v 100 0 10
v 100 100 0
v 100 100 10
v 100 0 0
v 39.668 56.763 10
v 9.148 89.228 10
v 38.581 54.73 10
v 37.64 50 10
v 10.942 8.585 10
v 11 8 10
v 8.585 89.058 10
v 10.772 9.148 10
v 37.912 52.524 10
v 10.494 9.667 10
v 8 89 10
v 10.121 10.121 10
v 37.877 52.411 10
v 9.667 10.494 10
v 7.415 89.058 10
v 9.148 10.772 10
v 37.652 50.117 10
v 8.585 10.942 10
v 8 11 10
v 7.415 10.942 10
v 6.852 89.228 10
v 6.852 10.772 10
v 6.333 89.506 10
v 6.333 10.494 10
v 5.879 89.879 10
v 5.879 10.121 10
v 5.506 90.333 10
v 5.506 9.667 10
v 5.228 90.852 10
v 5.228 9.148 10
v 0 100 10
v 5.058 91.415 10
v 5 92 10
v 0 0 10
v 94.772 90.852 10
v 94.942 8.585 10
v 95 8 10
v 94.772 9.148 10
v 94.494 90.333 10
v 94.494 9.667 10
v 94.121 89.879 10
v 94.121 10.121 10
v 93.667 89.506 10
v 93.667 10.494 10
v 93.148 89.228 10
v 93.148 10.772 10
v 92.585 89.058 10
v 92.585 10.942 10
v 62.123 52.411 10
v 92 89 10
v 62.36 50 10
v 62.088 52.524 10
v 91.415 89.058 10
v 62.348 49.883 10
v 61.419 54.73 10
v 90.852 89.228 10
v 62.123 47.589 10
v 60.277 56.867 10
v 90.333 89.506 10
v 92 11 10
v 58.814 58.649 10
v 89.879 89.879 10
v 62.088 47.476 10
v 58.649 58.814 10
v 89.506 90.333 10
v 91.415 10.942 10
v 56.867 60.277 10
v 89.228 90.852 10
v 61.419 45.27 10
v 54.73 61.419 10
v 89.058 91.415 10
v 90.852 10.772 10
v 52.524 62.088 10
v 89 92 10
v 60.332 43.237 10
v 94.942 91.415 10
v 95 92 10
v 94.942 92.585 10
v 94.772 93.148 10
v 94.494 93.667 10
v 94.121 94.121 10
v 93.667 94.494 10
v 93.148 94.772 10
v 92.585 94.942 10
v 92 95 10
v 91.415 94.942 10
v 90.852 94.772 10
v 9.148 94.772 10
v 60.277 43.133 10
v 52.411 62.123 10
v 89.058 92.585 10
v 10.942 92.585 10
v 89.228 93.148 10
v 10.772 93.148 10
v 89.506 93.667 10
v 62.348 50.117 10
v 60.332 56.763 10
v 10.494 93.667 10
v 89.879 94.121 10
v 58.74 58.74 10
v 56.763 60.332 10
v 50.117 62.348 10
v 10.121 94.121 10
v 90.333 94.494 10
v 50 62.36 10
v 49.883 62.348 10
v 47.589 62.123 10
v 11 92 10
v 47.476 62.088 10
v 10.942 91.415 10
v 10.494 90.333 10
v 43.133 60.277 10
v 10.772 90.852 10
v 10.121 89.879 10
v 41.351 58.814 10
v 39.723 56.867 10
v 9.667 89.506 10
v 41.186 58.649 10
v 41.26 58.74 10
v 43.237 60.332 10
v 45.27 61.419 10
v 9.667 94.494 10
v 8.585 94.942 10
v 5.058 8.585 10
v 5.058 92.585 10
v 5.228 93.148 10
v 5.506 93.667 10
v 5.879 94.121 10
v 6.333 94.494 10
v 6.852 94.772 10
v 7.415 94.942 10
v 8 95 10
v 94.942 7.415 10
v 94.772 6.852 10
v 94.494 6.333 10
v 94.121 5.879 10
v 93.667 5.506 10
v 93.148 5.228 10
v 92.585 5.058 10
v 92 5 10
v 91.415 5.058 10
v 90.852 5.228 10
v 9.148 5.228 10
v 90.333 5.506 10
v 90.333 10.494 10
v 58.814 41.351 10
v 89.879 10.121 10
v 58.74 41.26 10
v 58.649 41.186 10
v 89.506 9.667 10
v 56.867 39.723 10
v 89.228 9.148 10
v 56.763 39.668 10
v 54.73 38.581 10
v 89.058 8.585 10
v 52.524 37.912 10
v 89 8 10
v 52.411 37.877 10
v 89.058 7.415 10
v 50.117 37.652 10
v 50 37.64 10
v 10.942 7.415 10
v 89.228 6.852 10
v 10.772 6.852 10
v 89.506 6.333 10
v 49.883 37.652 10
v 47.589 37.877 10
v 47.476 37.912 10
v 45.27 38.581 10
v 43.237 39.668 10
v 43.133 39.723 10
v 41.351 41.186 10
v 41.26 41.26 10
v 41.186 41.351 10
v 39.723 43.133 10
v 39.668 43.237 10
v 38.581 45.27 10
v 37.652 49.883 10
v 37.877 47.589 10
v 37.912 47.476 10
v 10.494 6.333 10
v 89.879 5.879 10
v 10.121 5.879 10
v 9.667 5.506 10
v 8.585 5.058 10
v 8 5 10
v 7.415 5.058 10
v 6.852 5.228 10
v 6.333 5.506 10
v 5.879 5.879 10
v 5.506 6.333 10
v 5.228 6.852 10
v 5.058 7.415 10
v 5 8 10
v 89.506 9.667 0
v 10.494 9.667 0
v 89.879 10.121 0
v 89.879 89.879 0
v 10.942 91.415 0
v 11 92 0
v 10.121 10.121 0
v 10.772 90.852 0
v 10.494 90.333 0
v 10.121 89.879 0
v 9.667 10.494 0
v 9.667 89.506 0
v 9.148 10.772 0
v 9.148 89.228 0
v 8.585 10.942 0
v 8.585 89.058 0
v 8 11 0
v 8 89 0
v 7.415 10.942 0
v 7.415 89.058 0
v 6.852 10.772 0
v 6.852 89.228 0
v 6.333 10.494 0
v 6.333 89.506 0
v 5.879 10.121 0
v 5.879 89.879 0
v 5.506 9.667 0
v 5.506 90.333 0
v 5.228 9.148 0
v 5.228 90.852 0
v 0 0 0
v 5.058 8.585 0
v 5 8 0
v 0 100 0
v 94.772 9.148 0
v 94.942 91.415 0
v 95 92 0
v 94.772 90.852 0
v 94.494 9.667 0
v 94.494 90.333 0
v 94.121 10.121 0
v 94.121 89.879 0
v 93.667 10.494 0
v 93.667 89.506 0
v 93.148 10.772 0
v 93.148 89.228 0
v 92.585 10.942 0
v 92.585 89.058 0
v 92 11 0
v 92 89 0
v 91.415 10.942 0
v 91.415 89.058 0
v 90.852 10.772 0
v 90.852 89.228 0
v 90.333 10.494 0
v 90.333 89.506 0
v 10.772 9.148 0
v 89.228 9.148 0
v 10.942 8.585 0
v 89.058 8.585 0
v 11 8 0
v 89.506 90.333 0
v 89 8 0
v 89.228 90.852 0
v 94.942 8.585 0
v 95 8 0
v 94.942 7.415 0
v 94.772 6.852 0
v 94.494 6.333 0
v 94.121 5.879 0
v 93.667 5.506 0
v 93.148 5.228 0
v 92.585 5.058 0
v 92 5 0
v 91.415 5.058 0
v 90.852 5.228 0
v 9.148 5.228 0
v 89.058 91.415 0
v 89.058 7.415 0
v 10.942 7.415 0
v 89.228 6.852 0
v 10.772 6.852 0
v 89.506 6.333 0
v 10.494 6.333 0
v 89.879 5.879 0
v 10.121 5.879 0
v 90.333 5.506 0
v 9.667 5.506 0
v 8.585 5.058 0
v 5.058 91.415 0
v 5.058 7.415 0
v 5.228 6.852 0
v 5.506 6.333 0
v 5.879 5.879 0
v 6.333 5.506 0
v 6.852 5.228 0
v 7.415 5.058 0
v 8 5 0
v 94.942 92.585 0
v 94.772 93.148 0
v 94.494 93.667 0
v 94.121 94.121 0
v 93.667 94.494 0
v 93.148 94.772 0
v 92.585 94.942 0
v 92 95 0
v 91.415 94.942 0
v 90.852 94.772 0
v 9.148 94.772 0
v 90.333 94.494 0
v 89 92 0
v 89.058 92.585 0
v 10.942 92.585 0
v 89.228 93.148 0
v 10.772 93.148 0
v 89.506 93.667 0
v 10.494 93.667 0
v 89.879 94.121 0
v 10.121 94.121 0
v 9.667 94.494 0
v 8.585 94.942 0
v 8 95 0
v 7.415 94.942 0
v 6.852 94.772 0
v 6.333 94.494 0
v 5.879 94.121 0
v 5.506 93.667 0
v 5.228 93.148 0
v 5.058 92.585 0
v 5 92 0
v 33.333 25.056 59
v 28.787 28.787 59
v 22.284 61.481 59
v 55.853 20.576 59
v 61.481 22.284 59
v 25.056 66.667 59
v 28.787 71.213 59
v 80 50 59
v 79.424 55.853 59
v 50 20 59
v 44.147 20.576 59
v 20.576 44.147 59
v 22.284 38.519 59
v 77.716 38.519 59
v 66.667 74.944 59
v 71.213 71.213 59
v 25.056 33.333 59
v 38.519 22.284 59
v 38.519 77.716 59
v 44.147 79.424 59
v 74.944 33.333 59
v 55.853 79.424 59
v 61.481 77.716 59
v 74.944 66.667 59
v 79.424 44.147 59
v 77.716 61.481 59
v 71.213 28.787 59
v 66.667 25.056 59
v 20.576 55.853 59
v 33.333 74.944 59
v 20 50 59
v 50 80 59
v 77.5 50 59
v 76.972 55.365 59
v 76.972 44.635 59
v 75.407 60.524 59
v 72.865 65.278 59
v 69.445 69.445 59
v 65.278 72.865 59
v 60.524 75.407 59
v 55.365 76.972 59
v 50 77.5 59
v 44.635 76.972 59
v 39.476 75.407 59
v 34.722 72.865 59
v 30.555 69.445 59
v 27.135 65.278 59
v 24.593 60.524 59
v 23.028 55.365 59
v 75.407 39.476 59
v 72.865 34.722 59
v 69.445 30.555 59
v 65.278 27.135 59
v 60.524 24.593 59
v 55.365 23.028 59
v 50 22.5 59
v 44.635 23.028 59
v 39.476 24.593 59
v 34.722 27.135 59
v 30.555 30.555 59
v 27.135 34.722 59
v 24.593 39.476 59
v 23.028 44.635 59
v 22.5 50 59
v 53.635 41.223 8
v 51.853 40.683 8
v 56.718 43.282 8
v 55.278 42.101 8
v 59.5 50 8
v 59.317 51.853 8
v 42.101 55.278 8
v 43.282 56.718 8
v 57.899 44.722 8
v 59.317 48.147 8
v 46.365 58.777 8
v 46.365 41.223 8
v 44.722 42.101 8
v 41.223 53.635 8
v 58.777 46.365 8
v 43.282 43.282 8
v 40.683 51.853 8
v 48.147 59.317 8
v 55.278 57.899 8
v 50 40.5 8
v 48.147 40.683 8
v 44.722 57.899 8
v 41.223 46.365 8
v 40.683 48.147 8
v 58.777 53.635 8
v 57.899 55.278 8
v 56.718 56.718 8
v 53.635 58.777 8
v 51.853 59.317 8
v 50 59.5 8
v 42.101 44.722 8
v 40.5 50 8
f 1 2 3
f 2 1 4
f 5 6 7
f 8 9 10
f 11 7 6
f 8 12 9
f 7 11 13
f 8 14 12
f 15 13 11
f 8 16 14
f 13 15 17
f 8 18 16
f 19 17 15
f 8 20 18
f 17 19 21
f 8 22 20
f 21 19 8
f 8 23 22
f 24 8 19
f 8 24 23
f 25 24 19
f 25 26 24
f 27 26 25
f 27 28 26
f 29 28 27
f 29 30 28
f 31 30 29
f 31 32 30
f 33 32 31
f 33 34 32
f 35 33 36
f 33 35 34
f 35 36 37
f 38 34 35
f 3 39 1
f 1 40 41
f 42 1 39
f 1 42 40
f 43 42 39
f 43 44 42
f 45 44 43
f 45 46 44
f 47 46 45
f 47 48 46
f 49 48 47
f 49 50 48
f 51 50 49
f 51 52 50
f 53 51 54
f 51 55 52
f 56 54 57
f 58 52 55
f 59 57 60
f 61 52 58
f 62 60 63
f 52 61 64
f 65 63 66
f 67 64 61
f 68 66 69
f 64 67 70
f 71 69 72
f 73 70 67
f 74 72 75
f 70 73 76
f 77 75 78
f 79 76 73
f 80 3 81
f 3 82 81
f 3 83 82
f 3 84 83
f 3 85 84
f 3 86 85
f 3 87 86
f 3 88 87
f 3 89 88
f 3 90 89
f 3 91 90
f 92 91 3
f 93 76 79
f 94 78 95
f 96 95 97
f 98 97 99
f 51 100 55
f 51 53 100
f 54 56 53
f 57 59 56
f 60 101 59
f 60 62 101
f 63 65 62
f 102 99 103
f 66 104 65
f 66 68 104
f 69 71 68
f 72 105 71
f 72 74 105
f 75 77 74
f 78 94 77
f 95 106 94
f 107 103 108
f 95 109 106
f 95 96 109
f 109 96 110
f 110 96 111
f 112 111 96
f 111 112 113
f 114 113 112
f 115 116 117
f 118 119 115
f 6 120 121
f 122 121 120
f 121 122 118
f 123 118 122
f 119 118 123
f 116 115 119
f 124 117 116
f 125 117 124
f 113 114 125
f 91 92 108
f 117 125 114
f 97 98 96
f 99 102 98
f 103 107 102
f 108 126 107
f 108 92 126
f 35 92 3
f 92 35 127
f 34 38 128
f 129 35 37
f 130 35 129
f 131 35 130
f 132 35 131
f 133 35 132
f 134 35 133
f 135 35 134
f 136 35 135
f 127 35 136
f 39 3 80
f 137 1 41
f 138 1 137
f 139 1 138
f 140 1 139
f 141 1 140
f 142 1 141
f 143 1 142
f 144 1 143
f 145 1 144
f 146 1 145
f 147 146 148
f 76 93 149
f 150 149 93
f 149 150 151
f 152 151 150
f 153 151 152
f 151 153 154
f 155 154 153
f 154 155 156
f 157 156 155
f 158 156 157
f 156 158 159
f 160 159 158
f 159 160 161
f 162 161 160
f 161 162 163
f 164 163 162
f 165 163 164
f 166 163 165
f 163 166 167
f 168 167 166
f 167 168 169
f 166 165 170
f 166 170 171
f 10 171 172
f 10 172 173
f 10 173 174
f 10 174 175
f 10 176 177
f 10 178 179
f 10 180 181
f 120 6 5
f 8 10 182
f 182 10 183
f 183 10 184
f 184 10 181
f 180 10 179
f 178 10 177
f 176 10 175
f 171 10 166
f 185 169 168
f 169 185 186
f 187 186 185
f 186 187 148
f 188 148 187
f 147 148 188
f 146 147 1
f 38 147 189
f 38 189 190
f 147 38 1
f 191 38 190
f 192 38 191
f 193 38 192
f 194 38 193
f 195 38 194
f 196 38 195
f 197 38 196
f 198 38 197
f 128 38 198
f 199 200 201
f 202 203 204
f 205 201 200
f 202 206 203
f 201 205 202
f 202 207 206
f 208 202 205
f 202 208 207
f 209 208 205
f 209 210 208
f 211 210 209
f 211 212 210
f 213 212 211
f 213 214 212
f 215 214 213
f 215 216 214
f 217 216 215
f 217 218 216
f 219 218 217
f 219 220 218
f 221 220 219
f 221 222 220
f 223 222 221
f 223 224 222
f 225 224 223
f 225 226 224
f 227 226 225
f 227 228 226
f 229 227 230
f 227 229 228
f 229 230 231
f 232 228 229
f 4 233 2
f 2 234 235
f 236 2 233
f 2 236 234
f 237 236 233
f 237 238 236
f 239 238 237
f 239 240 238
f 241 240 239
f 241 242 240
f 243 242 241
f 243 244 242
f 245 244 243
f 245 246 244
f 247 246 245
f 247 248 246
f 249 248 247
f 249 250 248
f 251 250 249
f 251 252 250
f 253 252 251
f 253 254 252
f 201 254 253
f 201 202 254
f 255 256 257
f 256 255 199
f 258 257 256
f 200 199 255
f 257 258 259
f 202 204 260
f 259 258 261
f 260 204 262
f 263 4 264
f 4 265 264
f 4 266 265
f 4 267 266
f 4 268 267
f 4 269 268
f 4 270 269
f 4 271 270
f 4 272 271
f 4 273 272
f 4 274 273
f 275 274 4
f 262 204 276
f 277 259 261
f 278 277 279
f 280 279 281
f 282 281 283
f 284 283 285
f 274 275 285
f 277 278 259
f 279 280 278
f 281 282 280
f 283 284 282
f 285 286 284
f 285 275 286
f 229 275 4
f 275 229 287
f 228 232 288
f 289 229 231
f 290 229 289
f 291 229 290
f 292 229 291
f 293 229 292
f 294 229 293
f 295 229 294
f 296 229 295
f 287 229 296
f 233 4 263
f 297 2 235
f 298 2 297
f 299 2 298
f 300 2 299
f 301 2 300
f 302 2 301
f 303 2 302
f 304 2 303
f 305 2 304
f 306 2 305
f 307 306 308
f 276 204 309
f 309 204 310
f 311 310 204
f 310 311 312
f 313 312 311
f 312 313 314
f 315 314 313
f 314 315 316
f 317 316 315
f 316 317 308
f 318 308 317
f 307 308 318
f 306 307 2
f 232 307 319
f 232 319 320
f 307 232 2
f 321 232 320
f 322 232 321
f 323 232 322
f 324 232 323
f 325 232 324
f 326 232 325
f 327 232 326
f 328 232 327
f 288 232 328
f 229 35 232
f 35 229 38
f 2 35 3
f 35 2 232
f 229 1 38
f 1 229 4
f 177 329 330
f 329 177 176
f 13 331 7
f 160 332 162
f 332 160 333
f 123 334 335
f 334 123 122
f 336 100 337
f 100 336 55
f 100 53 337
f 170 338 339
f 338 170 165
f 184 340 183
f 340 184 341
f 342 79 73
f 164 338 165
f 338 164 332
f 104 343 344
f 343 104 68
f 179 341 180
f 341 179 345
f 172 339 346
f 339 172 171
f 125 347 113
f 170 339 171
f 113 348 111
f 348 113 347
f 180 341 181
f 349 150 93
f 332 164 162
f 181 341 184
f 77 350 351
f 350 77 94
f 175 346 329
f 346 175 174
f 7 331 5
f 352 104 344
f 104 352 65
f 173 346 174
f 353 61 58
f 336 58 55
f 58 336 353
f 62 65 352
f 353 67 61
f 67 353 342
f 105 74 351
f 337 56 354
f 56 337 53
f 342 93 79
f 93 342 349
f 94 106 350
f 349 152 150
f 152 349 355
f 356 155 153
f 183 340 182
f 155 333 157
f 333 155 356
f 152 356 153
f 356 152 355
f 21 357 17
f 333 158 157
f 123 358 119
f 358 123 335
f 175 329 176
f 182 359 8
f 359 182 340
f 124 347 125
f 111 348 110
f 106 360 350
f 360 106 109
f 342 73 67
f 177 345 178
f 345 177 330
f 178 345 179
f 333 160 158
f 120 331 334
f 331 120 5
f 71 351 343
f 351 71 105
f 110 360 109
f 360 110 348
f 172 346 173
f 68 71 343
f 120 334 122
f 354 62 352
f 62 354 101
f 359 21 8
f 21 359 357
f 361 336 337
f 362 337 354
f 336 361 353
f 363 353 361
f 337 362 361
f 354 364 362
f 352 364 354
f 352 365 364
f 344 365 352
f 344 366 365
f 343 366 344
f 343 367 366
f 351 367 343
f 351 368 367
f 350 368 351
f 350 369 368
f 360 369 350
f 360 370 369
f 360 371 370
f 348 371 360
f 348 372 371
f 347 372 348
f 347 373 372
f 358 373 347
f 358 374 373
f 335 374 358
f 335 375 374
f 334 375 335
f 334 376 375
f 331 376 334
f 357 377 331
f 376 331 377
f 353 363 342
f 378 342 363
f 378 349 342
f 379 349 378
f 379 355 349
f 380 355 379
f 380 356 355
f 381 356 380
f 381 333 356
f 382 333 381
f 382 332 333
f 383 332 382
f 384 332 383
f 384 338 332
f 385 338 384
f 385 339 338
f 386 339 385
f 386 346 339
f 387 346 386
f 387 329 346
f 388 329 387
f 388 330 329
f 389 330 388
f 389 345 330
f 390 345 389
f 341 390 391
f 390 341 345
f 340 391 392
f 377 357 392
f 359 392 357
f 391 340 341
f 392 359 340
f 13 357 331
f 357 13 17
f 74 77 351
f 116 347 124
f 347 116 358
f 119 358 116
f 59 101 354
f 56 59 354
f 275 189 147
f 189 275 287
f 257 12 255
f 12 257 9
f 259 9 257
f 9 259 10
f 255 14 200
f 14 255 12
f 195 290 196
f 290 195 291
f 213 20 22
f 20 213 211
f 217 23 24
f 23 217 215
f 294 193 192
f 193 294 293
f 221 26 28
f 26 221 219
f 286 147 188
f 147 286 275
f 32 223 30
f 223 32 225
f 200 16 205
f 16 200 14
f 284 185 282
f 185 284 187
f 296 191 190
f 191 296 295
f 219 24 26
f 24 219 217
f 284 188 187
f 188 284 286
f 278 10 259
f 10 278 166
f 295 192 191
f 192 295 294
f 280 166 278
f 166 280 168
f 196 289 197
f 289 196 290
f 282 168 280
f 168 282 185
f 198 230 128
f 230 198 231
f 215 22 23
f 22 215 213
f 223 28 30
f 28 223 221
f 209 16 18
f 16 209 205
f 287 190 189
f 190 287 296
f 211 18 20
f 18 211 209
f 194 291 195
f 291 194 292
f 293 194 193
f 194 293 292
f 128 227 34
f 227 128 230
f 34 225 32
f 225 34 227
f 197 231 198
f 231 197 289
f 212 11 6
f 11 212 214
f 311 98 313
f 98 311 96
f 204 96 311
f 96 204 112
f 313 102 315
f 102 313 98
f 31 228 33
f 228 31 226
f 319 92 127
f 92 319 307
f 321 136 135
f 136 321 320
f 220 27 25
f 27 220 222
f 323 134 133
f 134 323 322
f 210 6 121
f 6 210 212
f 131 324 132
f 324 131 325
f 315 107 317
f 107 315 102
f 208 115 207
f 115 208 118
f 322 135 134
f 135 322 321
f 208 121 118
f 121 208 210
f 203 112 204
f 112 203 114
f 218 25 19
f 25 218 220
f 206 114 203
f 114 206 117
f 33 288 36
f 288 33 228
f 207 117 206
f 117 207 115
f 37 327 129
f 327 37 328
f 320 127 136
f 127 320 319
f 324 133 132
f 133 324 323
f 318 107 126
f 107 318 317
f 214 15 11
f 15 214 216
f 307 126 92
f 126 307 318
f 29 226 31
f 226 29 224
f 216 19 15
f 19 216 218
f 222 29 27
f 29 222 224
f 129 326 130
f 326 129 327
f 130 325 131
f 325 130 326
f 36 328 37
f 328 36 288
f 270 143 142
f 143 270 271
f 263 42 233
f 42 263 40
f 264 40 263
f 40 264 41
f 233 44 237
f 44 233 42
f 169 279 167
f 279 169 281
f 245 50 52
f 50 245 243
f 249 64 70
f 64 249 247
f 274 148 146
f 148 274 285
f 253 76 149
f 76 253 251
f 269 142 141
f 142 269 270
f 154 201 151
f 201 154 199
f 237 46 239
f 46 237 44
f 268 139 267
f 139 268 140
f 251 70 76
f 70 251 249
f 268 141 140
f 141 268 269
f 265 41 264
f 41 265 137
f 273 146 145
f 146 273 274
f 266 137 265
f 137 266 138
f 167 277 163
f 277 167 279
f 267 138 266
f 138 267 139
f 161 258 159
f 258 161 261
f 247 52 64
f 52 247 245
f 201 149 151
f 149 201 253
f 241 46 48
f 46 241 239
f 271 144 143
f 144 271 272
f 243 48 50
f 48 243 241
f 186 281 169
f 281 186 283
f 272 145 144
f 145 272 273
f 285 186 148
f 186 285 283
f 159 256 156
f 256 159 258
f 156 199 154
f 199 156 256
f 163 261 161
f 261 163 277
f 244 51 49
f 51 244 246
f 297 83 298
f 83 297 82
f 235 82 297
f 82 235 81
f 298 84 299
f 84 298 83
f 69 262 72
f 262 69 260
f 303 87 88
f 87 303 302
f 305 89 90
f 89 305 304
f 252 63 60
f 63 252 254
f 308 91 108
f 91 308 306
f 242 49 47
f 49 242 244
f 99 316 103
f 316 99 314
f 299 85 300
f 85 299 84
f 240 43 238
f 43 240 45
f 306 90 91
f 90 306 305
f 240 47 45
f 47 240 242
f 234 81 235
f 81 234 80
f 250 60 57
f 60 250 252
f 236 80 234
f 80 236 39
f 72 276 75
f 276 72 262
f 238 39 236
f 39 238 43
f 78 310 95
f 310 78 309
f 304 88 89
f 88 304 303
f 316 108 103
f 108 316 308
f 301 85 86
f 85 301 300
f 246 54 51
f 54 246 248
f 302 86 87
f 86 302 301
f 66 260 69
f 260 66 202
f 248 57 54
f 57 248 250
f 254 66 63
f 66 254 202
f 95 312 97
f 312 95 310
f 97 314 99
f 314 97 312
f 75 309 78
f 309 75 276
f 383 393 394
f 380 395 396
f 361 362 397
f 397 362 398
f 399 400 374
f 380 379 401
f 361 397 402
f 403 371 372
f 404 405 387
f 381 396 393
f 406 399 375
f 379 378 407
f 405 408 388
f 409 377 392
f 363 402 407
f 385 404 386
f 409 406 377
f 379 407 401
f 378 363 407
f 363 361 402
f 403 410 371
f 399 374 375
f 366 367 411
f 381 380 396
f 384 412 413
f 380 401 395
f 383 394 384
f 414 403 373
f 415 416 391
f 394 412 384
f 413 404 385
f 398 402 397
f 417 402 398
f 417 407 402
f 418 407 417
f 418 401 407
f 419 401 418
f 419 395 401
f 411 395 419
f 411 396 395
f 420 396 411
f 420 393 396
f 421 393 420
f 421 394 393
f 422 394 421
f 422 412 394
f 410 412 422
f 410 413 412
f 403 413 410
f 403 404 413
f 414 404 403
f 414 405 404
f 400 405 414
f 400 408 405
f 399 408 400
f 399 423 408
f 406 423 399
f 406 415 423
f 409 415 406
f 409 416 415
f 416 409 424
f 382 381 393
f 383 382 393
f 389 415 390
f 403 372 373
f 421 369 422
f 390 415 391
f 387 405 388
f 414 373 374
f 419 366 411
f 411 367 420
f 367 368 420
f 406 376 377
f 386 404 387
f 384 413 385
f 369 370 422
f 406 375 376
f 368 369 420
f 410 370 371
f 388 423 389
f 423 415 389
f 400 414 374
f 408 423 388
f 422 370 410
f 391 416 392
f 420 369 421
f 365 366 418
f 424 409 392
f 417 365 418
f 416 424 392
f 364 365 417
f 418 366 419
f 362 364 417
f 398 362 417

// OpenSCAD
$fn = 32;

// ----------------------------------------------------------------------
// Hopper: flanged with square flange
// ----------------------------------------------------------------------

// --- parameters (mm) ---
fl = 100;                 // flange side, X and Y
fl_t = 10;                // flange thickness
cone_h = 50;              // cone height above the flange
top_d = 60;               // cone mouth diameter
bot_d = 24;               // cone spout diameter
wall = 2.5;               // cone wall thickness
hole_r = 3;               // flange hole radius
hole_in = 8;              // hole inset from the corners

bore_d = bot_d - 2 * wall;  // spout bore diameter
total_h = fl_t + cone_h - 1;  // overall height

difference() {
  union() {
    cube([fl, fl, fl_t]);
    translate([fl / 2, fl / 2, fl_t - 1])
      cylinder(h = cone_h, d1 = bot_d, d2 = top_d);
  }
  translate([fl / 2, fl / 2, fl_t - 2])
    cylinder(h = cone_h + 1, d1 = bore_d, d2 = top_d - 2 * wall);
  for (sx = [0, 1], sy = [0, 1])
    translate([sx ? fl - hole_in : hole_in,
               sy ? fl - hole_in : hole_in, -1])
      cylinder(r = hole_r, h = fl_t + 2);
}
